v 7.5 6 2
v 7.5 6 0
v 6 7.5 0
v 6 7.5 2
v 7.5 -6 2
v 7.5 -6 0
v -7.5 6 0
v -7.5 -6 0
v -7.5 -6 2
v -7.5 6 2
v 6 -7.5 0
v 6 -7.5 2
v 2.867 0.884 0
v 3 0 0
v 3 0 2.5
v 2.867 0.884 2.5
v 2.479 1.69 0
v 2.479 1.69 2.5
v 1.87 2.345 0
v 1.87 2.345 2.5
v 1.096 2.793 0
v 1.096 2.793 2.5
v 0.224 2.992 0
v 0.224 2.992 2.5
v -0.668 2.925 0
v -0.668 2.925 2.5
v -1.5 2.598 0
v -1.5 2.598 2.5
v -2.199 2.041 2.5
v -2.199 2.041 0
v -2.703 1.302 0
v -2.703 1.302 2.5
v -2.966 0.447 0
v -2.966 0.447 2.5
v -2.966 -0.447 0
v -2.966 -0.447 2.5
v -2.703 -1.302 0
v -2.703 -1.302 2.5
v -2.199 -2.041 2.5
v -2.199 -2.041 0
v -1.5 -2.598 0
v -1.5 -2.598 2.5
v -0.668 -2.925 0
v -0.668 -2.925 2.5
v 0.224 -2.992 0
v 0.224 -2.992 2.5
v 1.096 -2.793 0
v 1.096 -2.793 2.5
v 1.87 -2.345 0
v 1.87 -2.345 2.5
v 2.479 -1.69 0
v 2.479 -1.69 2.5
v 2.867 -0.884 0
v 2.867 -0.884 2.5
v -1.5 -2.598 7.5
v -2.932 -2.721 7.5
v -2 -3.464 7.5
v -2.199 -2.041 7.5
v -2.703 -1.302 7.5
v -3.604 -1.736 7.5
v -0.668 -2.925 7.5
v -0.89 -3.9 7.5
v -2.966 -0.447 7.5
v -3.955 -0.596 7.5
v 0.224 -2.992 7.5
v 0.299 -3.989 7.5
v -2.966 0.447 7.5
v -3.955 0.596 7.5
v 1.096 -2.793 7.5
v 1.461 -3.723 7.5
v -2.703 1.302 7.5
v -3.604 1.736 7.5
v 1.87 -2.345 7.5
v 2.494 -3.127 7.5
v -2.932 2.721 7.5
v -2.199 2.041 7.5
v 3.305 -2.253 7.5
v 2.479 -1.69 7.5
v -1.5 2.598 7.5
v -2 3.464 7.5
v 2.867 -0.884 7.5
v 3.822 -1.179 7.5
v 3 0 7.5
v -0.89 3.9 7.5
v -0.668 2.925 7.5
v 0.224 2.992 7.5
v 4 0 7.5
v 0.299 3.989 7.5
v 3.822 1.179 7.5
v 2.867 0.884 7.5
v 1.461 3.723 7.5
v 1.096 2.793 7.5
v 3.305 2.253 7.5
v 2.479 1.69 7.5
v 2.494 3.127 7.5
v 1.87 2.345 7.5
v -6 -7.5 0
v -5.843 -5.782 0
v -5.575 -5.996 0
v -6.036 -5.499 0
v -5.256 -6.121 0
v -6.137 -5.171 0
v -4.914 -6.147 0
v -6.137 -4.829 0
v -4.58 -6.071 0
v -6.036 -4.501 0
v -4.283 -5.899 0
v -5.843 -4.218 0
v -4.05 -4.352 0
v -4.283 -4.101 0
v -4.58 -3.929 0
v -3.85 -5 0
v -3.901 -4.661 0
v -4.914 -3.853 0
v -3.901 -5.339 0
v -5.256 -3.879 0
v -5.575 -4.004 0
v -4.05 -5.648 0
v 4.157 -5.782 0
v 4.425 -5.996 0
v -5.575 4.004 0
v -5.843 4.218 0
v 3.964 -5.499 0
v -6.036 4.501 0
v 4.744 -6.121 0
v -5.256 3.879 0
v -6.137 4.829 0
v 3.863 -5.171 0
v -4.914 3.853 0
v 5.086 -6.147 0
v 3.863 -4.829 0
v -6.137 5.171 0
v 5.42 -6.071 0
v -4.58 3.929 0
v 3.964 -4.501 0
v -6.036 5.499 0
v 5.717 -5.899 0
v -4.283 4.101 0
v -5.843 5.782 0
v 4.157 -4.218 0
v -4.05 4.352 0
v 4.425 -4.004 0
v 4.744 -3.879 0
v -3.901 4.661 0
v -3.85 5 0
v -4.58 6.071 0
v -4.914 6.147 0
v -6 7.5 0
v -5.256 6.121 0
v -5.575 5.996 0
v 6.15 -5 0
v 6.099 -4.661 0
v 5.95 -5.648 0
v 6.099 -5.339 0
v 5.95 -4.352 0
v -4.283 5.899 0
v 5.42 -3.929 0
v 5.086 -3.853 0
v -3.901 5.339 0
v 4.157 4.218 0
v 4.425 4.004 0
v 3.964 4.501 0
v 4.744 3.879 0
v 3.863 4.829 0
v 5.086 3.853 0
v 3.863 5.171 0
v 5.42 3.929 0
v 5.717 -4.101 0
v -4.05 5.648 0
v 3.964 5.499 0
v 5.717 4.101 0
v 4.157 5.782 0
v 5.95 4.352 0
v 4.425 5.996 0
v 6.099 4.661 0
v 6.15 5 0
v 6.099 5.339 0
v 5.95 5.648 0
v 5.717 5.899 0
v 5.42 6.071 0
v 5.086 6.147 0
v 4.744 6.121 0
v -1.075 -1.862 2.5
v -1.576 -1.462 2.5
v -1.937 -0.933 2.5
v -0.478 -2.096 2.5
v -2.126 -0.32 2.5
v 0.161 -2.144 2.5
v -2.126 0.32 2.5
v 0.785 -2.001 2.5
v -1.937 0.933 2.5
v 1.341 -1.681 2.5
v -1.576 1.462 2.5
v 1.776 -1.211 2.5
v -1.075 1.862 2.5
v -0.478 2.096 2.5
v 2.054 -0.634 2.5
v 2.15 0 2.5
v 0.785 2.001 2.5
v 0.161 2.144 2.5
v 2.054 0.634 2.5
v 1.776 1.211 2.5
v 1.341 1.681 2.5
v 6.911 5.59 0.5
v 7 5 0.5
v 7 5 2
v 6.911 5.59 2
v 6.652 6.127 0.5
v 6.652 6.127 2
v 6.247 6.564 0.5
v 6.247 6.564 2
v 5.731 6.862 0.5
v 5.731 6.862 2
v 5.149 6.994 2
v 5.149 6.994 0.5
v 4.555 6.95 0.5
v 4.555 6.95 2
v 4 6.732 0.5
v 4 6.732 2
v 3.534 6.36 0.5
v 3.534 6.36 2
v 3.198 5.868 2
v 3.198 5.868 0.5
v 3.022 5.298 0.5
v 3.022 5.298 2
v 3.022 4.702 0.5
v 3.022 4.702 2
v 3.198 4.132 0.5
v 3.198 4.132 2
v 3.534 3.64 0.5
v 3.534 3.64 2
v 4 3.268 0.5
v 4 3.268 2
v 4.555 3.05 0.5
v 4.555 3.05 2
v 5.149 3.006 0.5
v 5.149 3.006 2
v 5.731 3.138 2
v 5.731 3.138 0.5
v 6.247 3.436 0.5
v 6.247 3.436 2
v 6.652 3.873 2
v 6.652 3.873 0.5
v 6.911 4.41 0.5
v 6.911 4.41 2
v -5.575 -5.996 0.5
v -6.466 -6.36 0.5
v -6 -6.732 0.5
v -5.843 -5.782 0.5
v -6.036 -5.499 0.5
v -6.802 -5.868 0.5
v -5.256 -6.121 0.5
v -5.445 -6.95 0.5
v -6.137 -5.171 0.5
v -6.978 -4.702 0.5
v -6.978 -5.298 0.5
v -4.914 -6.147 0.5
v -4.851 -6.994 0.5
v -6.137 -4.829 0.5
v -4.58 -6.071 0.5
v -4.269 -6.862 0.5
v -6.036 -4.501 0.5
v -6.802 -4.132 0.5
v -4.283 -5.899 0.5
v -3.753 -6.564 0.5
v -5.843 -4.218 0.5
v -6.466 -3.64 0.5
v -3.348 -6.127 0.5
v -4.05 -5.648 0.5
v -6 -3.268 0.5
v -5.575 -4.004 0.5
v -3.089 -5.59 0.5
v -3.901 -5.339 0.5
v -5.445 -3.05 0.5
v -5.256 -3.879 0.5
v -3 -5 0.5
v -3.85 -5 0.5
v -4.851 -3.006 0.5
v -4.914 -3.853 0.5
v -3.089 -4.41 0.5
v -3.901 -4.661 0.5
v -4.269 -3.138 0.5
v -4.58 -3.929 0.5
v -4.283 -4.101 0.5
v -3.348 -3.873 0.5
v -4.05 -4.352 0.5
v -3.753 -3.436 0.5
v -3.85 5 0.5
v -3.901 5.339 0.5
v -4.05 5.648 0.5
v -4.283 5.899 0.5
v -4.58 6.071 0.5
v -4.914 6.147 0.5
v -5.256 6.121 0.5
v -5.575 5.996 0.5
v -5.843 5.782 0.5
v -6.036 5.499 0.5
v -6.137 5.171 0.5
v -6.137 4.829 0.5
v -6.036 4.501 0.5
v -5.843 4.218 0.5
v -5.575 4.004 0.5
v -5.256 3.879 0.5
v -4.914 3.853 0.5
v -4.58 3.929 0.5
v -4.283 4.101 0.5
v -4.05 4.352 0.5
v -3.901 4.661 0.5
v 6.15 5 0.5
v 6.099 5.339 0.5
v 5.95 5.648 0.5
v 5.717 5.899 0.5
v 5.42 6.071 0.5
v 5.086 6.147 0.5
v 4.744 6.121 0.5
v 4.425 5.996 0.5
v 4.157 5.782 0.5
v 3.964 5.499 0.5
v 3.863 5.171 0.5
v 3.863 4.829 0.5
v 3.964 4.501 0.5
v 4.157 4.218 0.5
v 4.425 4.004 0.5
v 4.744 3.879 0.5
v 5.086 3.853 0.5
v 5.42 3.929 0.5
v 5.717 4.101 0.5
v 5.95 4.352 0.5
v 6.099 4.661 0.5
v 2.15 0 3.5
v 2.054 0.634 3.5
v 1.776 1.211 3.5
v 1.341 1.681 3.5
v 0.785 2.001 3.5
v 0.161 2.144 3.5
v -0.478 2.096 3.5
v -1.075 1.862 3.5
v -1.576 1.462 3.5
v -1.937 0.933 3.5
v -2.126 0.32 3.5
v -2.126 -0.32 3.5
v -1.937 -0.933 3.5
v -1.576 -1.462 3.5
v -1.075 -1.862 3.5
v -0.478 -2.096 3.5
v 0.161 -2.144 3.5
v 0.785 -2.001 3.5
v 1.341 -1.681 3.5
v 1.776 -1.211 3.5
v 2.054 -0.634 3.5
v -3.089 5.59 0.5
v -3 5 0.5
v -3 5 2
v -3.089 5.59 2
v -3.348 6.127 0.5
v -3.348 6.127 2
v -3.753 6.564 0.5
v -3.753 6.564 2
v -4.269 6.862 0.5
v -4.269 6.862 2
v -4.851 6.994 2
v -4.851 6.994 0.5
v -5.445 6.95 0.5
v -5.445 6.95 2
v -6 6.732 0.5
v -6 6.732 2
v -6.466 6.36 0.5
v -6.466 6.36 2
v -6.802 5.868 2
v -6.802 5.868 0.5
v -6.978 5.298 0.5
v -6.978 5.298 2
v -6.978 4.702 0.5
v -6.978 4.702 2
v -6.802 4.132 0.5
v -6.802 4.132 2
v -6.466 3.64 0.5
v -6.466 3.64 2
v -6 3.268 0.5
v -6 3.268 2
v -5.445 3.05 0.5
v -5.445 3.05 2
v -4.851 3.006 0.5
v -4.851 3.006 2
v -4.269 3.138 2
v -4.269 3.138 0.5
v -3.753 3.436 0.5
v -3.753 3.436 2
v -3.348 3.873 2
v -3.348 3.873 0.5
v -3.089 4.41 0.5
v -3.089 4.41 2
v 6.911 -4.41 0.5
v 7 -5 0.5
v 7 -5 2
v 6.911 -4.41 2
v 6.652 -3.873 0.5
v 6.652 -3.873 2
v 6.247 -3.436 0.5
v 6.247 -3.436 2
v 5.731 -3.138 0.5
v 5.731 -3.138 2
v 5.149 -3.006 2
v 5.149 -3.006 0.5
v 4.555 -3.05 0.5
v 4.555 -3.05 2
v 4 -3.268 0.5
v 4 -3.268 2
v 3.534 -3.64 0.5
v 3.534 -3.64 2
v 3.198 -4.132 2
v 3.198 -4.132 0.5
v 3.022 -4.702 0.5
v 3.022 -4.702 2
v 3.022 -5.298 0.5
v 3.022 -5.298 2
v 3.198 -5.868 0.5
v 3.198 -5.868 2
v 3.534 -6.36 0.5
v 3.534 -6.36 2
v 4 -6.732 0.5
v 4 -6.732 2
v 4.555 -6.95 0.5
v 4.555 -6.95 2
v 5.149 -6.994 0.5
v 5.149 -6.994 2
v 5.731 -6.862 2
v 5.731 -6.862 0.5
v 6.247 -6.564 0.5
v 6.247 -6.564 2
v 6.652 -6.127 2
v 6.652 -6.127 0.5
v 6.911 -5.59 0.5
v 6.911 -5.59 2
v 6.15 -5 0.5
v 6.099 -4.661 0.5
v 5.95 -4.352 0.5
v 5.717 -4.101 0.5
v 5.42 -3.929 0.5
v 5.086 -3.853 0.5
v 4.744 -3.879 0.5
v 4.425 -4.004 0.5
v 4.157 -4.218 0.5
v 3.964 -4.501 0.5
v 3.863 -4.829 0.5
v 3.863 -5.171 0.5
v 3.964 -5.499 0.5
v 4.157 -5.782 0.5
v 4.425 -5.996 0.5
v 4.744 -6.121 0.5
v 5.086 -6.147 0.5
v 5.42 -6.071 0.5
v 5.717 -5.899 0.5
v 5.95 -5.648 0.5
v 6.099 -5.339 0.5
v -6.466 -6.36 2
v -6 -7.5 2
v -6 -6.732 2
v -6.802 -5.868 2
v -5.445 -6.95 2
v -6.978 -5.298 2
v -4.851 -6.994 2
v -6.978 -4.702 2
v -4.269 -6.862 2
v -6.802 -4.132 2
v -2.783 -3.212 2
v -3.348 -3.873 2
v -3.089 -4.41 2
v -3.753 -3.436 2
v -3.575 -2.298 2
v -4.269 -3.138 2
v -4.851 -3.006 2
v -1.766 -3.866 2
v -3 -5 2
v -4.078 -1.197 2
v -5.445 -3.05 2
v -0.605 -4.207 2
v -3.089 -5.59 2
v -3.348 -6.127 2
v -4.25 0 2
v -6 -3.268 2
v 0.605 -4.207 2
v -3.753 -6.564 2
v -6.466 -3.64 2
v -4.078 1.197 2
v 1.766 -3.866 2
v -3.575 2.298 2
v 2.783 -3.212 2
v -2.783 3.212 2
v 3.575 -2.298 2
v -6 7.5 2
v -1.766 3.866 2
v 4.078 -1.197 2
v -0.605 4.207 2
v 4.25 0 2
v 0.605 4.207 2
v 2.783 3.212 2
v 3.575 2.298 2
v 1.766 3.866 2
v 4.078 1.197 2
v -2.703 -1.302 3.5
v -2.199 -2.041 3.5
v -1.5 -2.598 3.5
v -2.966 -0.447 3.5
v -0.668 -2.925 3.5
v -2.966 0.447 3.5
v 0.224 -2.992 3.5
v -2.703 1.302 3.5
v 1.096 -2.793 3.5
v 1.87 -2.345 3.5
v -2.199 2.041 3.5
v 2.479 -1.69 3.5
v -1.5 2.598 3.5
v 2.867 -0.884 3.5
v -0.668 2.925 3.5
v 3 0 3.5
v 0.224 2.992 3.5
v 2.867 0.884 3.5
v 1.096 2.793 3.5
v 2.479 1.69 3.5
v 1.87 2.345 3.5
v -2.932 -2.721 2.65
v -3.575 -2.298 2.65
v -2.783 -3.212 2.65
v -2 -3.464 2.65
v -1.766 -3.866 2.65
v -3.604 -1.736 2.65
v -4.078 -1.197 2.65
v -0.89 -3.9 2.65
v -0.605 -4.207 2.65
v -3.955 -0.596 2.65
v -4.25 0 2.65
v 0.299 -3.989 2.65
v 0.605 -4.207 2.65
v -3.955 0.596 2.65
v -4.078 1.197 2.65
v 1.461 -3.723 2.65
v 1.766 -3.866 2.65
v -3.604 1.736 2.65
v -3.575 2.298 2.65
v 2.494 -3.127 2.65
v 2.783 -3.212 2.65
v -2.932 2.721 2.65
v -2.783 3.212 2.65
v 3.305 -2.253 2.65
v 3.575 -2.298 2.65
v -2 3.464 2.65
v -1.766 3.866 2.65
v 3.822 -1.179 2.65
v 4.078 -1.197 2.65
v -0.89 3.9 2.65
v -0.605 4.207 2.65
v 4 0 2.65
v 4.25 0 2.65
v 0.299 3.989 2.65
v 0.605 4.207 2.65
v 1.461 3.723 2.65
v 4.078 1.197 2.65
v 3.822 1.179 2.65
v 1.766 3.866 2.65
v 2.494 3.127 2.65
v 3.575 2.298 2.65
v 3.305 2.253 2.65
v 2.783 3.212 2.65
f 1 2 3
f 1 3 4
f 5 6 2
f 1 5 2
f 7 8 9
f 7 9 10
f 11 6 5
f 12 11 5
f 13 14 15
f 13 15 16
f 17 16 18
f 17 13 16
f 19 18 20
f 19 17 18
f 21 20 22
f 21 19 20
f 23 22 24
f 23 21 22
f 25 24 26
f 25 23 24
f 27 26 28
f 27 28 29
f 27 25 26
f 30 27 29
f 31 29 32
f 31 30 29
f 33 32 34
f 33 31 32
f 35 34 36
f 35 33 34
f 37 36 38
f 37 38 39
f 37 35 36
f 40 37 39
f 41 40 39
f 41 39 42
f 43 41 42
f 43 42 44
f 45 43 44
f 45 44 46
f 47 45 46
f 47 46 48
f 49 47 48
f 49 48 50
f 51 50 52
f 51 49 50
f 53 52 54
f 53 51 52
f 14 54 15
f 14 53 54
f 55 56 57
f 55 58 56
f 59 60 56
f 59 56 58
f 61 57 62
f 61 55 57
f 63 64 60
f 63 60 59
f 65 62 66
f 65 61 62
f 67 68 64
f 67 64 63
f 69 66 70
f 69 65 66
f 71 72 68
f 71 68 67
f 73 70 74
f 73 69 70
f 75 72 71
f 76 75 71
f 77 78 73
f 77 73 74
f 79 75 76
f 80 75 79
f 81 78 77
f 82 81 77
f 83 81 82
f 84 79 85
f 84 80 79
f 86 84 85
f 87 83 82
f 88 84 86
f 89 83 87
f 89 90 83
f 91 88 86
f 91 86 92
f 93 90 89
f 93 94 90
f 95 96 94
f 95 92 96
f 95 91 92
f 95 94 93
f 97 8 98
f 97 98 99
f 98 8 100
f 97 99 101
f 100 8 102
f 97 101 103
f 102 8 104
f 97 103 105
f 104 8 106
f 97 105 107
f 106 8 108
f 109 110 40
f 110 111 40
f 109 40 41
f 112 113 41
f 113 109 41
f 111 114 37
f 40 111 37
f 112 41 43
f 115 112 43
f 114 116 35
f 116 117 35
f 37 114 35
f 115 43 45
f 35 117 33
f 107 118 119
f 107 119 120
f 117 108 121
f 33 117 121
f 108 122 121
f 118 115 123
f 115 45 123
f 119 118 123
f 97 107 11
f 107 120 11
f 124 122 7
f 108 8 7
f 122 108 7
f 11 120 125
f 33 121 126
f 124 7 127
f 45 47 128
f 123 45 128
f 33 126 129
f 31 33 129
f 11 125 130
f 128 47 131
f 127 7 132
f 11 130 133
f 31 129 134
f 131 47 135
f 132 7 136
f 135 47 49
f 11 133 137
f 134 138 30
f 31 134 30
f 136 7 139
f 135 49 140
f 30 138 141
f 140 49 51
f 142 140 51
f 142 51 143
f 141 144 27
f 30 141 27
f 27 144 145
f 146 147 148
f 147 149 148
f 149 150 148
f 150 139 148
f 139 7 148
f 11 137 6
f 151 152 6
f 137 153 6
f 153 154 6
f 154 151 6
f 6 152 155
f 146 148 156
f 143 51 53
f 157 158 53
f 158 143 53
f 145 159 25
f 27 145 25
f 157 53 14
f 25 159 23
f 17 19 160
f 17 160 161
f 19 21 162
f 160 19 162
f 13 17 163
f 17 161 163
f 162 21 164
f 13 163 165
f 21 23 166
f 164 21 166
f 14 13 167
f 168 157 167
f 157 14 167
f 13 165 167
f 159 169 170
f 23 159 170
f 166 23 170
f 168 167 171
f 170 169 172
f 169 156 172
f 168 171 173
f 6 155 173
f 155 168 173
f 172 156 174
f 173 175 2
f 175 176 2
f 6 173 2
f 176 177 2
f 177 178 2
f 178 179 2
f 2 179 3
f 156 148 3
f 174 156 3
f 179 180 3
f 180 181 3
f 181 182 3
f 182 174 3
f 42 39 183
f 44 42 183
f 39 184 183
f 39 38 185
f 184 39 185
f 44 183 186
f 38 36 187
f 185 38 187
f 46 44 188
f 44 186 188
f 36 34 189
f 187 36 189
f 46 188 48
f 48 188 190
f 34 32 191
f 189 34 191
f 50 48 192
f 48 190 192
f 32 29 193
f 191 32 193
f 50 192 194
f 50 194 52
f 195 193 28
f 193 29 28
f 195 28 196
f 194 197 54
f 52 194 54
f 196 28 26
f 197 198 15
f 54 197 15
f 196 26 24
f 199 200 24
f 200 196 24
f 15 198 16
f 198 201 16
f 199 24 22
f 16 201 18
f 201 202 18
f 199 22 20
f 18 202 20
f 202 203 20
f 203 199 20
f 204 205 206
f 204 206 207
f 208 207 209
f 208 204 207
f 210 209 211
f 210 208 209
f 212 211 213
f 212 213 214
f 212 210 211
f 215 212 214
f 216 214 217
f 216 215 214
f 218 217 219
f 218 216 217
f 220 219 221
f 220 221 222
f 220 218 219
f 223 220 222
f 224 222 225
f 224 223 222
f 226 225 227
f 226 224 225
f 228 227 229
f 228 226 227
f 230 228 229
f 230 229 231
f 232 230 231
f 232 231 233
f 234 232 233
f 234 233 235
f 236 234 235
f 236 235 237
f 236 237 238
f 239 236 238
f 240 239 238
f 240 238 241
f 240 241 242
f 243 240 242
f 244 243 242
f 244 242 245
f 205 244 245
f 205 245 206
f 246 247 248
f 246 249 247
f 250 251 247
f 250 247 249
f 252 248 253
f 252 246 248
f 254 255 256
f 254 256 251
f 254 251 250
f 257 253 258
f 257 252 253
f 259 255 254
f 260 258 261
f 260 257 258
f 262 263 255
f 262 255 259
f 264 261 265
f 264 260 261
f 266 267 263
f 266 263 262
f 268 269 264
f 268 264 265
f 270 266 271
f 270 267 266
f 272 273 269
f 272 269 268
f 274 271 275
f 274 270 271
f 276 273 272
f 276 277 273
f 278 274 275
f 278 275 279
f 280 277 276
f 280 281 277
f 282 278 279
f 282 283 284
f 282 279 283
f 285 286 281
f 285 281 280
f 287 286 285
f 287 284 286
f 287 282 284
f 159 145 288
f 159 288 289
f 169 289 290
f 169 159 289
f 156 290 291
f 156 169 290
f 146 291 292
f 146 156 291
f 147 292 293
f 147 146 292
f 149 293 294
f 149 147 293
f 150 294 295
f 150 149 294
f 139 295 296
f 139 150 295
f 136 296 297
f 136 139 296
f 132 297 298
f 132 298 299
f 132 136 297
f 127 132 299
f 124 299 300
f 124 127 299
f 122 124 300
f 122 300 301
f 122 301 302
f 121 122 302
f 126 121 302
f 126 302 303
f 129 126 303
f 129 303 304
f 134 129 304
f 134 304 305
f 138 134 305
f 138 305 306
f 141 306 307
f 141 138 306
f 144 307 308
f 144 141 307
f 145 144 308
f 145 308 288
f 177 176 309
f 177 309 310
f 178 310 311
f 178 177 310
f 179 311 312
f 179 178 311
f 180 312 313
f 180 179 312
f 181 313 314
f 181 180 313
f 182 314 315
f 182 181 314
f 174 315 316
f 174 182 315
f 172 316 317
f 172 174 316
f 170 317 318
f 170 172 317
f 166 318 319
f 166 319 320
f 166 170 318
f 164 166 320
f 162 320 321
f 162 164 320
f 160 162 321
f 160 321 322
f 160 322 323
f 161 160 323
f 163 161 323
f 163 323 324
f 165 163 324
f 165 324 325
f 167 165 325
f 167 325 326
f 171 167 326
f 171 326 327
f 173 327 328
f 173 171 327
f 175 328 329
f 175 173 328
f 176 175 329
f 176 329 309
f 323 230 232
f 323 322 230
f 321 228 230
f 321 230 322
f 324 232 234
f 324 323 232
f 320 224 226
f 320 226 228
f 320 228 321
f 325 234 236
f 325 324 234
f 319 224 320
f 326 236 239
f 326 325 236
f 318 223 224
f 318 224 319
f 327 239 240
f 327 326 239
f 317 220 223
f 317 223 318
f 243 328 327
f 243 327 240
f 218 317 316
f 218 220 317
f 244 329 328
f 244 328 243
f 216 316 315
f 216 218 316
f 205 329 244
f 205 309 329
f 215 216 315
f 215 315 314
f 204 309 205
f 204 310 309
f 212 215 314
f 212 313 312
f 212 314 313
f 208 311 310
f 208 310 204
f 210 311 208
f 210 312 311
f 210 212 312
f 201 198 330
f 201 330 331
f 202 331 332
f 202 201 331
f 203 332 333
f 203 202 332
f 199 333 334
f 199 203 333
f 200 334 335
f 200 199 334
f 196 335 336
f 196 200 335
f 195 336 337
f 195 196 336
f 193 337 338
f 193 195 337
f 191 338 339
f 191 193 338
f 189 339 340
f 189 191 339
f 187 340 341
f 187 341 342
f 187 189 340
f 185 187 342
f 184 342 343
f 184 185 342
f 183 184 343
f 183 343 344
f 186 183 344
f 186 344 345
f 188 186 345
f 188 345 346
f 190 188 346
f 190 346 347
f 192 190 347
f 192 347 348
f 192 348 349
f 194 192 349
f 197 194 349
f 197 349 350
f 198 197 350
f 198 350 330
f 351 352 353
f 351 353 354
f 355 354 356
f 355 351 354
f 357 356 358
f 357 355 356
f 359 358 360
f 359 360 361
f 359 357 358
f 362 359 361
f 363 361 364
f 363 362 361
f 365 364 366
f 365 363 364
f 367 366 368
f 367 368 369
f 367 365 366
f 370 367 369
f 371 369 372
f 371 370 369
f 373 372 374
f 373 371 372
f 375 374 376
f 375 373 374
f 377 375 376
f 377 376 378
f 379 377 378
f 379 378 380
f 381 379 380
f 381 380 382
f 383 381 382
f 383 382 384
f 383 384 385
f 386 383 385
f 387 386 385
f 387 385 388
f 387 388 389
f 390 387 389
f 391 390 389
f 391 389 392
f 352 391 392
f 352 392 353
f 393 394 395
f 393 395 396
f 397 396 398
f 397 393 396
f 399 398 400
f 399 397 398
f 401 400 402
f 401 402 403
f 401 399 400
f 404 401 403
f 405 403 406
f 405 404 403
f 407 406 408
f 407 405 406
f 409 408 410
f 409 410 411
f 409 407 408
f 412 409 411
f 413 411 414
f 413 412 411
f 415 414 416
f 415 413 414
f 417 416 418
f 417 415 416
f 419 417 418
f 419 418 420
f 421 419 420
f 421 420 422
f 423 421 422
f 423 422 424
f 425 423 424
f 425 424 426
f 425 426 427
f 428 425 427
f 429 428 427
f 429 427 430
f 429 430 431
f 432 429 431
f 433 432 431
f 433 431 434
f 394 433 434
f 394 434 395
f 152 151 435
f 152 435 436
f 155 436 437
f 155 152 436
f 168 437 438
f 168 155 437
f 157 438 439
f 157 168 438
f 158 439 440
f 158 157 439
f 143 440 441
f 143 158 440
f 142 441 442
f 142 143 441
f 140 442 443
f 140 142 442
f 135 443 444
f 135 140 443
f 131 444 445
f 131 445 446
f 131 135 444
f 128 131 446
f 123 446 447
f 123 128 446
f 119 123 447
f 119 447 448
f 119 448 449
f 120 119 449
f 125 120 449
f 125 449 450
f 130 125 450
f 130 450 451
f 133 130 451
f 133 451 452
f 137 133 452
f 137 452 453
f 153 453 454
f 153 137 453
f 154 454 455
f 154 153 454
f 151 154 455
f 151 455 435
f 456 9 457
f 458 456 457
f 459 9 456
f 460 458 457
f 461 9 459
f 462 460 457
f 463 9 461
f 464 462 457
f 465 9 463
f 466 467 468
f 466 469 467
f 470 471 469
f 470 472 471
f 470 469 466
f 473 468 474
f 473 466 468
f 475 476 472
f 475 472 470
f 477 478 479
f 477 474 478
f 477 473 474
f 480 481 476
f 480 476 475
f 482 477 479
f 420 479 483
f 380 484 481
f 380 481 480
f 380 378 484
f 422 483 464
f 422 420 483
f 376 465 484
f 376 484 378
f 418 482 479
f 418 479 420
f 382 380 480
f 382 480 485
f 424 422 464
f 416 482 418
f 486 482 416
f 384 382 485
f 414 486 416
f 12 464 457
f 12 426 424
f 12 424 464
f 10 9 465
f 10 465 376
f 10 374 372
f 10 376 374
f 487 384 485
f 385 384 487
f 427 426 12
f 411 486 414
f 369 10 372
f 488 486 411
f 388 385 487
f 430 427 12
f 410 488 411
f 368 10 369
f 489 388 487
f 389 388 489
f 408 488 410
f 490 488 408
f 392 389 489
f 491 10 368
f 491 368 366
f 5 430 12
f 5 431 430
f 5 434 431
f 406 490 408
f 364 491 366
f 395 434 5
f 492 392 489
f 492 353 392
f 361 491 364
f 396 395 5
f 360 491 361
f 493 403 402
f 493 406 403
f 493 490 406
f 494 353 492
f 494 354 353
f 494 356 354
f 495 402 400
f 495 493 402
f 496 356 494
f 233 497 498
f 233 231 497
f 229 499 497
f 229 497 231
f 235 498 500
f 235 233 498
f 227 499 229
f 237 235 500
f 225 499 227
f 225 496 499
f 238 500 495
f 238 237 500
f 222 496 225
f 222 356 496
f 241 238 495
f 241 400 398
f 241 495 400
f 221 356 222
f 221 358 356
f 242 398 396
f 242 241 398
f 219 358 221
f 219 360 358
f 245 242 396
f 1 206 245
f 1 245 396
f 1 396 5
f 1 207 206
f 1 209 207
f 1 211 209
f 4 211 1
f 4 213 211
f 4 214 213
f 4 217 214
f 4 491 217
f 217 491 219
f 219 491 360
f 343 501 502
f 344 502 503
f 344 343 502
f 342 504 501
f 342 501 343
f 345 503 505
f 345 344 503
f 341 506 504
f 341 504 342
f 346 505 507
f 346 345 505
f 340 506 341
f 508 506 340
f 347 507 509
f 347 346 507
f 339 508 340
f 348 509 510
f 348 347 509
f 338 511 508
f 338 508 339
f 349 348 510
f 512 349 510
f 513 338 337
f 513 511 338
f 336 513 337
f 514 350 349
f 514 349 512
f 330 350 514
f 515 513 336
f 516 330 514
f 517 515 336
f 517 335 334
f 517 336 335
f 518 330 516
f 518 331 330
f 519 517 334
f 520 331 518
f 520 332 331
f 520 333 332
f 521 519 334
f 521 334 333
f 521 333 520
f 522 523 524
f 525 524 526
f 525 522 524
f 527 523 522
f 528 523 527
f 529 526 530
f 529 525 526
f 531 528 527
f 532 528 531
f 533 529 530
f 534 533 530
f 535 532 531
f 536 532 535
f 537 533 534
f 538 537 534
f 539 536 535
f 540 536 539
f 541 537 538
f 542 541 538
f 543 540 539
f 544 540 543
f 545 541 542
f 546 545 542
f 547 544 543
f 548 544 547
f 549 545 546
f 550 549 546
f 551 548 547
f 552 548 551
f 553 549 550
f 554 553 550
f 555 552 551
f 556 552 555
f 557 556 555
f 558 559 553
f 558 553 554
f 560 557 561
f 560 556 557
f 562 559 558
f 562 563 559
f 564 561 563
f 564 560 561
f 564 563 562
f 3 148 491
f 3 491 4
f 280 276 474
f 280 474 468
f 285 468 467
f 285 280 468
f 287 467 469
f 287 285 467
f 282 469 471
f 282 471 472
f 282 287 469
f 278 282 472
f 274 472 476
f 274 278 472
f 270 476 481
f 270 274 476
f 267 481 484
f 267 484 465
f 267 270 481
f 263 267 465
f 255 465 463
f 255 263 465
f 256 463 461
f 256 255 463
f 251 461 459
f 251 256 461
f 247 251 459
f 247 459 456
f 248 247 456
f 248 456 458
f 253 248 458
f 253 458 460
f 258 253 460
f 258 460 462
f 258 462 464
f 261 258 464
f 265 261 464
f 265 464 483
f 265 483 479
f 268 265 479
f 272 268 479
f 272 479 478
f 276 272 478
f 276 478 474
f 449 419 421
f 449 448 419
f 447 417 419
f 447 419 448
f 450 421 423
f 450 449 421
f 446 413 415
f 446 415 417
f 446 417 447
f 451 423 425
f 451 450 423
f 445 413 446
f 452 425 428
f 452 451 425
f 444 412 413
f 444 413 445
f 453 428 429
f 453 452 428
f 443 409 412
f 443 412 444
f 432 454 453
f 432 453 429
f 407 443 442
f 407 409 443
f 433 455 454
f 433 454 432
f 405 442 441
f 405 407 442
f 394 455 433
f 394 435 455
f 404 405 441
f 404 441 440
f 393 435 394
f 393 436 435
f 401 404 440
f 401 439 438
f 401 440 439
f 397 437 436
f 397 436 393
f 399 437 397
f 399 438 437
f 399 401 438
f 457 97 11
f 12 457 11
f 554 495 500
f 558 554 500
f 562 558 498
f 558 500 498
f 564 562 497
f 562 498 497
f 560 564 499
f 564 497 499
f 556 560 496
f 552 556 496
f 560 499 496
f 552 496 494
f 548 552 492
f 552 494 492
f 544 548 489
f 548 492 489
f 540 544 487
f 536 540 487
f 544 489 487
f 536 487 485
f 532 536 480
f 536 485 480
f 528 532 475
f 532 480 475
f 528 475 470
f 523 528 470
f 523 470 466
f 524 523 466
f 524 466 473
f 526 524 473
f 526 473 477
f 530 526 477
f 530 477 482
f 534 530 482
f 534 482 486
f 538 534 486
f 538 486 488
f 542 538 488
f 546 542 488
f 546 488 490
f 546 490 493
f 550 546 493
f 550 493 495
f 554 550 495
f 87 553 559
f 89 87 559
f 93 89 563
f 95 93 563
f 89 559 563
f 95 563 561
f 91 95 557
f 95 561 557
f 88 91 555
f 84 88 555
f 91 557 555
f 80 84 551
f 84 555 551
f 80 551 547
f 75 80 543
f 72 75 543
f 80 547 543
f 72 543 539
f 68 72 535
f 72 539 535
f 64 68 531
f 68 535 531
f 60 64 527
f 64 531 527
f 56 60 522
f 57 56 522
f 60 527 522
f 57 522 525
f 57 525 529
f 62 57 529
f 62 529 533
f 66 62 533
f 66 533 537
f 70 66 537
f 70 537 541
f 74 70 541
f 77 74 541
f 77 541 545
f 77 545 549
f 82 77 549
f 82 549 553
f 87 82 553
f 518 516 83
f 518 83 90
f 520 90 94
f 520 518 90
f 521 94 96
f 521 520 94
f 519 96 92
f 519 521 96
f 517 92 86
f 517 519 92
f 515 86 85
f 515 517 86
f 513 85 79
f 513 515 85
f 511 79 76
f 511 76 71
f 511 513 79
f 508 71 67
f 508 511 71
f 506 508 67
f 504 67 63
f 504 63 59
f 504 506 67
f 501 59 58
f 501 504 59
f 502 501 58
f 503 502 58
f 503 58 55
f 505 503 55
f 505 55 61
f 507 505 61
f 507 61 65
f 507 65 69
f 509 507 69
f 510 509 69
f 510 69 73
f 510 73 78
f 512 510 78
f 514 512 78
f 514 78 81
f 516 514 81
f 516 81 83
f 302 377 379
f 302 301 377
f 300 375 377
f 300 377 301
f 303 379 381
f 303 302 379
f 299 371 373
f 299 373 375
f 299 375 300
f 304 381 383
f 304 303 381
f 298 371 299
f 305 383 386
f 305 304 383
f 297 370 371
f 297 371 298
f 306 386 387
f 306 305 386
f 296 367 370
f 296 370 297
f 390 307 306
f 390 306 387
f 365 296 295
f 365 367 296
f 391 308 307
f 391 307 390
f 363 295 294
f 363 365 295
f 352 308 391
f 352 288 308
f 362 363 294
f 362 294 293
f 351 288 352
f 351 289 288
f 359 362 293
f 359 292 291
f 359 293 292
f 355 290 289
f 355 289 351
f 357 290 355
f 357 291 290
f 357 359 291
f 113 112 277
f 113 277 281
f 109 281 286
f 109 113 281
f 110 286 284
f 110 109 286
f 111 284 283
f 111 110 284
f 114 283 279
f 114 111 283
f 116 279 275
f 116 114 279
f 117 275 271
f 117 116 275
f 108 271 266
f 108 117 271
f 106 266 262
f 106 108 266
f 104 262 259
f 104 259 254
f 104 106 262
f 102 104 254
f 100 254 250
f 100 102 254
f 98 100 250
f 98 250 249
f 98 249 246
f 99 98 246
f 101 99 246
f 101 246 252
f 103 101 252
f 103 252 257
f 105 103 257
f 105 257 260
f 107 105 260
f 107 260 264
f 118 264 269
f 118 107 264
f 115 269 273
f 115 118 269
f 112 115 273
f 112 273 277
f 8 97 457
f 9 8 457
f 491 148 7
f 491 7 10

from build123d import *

# Parameters (mm, degrees)
F0_W     = 15
F0_H     = 15
F0_R     = 2
F0_R_2   = 4.25
F1_DEPTH = 2
F0_R_3   = 4
F2_DEPTH = 2.65
F0_R_4   = 3.7599999923
F0_R_5   = 3
F3_DEPTH = 7.5
F0_R_6   = 2.15
F4_DEPTH = 3.5
F5_DEPTH = 2.5
F6_SIZE  = 1.5
F0_R_7   = 1.15
F7_DEPTH = 0.5


with BuildPart() as f1:
    # F0 (on Top) → F1 (new body)
    with BuildSketch(Plane.XY):
        Rectangle(F0_W, F0_H)
        with Locations((-5, -5)):
            Circle(F0_R, mode=Mode.SUBTRACT)
        with Locations((5, -5)):
            Circle(F0_R, mode=Mode.SUBTRACT)
        with Locations((-5, 5)):
            Circle(F0_R, mode=Mode.SUBTRACT)
        Circle(F0_R_2, mode=Mode.SUBTRACT)
        with Locations((5, 5)):
            Circle(F0_R, mode=Mode.SUBTRACT)
    extrude(amount=F1_DEPTH)

    # F0 (on Top) → F2 (join)
    with BuildSketch(Plane.XY):
        Circle(F0_R_2)
        Circle(F0_R_3, mode=Mode.SUBTRACT)
    extrude(amount=F2_DEPTH)

    # F0 (on Top) → F3 (join)
    with BuildSketch(Plane.XY):
        Circle(F0_R_3)
        Circle(F0_R_4, mode=Mode.SUBTRACT)
        Circle(F0_R_4)
        Circle(F0_R_5, mode=Mode.SUBTRACT)
    extrude(amount=F3_DEPTH)

    # F0 (on Top) → F4 (join)
    with BuildSketch(Plane.XY):
        Circle(F0_R_4)
        Circle(F0_R_5, mode=Mode.SUBTRACT)
        Circle(F0_R_5)
        Circle(F0_R_6, mode=Mode.SUBTRACT)
    extrude(amount=F4_DEPTH)

    # F0 (on Top) → F5 (cut)
    with BuildSketch(Plane.XY):
        Circle(F0_R_5)
        Circle(F0_R_6, mode=Mode.SUBTRACT)
    extrude(amount=F5_DEPTH, mode=Mode.SUBTRACT)

    # F6
    f6_edges = [f1.edges().sort_by_distance(p)[0] for p in [
        (7.5, -7.5, 1),
        (7.5, 7.5, 1),
        (-7.5, -7.5, 1),
        (-7.5, 7.5, 1),
    ]]
    chamfer(f6_edges, length=F6_SIZE)

    # F0 (on Top) → F7 (join)
    with BuildSketch(Plane.XY):
        with Locations((-5, 5)):
            Circle(F0_R)
        with Locations((-5, 5)):
            Circle(F0_R_7, mode=Mode.SUBTRACT)
        with Locations((5, 5)):
            Circle(F0_R)
        with Locations((5, 5)):
            Circle(F0_R_7, mode=Mode.SUBTRACT)
        with Locations((5, -5)):
            Circle(F0_R)
        with Locations((5, -5)):
            Circle(F0_R_7, mode=Mode.SUBTRACT)
        with Locations((-5, -5)):
            Circle(F0_R)
        with Locations((-5, -5)):
            Circle(F0_R_7, mode=Mode.SUBTRACT)
    extrude(amount=F7_DEPTH)


solid = f1.part
